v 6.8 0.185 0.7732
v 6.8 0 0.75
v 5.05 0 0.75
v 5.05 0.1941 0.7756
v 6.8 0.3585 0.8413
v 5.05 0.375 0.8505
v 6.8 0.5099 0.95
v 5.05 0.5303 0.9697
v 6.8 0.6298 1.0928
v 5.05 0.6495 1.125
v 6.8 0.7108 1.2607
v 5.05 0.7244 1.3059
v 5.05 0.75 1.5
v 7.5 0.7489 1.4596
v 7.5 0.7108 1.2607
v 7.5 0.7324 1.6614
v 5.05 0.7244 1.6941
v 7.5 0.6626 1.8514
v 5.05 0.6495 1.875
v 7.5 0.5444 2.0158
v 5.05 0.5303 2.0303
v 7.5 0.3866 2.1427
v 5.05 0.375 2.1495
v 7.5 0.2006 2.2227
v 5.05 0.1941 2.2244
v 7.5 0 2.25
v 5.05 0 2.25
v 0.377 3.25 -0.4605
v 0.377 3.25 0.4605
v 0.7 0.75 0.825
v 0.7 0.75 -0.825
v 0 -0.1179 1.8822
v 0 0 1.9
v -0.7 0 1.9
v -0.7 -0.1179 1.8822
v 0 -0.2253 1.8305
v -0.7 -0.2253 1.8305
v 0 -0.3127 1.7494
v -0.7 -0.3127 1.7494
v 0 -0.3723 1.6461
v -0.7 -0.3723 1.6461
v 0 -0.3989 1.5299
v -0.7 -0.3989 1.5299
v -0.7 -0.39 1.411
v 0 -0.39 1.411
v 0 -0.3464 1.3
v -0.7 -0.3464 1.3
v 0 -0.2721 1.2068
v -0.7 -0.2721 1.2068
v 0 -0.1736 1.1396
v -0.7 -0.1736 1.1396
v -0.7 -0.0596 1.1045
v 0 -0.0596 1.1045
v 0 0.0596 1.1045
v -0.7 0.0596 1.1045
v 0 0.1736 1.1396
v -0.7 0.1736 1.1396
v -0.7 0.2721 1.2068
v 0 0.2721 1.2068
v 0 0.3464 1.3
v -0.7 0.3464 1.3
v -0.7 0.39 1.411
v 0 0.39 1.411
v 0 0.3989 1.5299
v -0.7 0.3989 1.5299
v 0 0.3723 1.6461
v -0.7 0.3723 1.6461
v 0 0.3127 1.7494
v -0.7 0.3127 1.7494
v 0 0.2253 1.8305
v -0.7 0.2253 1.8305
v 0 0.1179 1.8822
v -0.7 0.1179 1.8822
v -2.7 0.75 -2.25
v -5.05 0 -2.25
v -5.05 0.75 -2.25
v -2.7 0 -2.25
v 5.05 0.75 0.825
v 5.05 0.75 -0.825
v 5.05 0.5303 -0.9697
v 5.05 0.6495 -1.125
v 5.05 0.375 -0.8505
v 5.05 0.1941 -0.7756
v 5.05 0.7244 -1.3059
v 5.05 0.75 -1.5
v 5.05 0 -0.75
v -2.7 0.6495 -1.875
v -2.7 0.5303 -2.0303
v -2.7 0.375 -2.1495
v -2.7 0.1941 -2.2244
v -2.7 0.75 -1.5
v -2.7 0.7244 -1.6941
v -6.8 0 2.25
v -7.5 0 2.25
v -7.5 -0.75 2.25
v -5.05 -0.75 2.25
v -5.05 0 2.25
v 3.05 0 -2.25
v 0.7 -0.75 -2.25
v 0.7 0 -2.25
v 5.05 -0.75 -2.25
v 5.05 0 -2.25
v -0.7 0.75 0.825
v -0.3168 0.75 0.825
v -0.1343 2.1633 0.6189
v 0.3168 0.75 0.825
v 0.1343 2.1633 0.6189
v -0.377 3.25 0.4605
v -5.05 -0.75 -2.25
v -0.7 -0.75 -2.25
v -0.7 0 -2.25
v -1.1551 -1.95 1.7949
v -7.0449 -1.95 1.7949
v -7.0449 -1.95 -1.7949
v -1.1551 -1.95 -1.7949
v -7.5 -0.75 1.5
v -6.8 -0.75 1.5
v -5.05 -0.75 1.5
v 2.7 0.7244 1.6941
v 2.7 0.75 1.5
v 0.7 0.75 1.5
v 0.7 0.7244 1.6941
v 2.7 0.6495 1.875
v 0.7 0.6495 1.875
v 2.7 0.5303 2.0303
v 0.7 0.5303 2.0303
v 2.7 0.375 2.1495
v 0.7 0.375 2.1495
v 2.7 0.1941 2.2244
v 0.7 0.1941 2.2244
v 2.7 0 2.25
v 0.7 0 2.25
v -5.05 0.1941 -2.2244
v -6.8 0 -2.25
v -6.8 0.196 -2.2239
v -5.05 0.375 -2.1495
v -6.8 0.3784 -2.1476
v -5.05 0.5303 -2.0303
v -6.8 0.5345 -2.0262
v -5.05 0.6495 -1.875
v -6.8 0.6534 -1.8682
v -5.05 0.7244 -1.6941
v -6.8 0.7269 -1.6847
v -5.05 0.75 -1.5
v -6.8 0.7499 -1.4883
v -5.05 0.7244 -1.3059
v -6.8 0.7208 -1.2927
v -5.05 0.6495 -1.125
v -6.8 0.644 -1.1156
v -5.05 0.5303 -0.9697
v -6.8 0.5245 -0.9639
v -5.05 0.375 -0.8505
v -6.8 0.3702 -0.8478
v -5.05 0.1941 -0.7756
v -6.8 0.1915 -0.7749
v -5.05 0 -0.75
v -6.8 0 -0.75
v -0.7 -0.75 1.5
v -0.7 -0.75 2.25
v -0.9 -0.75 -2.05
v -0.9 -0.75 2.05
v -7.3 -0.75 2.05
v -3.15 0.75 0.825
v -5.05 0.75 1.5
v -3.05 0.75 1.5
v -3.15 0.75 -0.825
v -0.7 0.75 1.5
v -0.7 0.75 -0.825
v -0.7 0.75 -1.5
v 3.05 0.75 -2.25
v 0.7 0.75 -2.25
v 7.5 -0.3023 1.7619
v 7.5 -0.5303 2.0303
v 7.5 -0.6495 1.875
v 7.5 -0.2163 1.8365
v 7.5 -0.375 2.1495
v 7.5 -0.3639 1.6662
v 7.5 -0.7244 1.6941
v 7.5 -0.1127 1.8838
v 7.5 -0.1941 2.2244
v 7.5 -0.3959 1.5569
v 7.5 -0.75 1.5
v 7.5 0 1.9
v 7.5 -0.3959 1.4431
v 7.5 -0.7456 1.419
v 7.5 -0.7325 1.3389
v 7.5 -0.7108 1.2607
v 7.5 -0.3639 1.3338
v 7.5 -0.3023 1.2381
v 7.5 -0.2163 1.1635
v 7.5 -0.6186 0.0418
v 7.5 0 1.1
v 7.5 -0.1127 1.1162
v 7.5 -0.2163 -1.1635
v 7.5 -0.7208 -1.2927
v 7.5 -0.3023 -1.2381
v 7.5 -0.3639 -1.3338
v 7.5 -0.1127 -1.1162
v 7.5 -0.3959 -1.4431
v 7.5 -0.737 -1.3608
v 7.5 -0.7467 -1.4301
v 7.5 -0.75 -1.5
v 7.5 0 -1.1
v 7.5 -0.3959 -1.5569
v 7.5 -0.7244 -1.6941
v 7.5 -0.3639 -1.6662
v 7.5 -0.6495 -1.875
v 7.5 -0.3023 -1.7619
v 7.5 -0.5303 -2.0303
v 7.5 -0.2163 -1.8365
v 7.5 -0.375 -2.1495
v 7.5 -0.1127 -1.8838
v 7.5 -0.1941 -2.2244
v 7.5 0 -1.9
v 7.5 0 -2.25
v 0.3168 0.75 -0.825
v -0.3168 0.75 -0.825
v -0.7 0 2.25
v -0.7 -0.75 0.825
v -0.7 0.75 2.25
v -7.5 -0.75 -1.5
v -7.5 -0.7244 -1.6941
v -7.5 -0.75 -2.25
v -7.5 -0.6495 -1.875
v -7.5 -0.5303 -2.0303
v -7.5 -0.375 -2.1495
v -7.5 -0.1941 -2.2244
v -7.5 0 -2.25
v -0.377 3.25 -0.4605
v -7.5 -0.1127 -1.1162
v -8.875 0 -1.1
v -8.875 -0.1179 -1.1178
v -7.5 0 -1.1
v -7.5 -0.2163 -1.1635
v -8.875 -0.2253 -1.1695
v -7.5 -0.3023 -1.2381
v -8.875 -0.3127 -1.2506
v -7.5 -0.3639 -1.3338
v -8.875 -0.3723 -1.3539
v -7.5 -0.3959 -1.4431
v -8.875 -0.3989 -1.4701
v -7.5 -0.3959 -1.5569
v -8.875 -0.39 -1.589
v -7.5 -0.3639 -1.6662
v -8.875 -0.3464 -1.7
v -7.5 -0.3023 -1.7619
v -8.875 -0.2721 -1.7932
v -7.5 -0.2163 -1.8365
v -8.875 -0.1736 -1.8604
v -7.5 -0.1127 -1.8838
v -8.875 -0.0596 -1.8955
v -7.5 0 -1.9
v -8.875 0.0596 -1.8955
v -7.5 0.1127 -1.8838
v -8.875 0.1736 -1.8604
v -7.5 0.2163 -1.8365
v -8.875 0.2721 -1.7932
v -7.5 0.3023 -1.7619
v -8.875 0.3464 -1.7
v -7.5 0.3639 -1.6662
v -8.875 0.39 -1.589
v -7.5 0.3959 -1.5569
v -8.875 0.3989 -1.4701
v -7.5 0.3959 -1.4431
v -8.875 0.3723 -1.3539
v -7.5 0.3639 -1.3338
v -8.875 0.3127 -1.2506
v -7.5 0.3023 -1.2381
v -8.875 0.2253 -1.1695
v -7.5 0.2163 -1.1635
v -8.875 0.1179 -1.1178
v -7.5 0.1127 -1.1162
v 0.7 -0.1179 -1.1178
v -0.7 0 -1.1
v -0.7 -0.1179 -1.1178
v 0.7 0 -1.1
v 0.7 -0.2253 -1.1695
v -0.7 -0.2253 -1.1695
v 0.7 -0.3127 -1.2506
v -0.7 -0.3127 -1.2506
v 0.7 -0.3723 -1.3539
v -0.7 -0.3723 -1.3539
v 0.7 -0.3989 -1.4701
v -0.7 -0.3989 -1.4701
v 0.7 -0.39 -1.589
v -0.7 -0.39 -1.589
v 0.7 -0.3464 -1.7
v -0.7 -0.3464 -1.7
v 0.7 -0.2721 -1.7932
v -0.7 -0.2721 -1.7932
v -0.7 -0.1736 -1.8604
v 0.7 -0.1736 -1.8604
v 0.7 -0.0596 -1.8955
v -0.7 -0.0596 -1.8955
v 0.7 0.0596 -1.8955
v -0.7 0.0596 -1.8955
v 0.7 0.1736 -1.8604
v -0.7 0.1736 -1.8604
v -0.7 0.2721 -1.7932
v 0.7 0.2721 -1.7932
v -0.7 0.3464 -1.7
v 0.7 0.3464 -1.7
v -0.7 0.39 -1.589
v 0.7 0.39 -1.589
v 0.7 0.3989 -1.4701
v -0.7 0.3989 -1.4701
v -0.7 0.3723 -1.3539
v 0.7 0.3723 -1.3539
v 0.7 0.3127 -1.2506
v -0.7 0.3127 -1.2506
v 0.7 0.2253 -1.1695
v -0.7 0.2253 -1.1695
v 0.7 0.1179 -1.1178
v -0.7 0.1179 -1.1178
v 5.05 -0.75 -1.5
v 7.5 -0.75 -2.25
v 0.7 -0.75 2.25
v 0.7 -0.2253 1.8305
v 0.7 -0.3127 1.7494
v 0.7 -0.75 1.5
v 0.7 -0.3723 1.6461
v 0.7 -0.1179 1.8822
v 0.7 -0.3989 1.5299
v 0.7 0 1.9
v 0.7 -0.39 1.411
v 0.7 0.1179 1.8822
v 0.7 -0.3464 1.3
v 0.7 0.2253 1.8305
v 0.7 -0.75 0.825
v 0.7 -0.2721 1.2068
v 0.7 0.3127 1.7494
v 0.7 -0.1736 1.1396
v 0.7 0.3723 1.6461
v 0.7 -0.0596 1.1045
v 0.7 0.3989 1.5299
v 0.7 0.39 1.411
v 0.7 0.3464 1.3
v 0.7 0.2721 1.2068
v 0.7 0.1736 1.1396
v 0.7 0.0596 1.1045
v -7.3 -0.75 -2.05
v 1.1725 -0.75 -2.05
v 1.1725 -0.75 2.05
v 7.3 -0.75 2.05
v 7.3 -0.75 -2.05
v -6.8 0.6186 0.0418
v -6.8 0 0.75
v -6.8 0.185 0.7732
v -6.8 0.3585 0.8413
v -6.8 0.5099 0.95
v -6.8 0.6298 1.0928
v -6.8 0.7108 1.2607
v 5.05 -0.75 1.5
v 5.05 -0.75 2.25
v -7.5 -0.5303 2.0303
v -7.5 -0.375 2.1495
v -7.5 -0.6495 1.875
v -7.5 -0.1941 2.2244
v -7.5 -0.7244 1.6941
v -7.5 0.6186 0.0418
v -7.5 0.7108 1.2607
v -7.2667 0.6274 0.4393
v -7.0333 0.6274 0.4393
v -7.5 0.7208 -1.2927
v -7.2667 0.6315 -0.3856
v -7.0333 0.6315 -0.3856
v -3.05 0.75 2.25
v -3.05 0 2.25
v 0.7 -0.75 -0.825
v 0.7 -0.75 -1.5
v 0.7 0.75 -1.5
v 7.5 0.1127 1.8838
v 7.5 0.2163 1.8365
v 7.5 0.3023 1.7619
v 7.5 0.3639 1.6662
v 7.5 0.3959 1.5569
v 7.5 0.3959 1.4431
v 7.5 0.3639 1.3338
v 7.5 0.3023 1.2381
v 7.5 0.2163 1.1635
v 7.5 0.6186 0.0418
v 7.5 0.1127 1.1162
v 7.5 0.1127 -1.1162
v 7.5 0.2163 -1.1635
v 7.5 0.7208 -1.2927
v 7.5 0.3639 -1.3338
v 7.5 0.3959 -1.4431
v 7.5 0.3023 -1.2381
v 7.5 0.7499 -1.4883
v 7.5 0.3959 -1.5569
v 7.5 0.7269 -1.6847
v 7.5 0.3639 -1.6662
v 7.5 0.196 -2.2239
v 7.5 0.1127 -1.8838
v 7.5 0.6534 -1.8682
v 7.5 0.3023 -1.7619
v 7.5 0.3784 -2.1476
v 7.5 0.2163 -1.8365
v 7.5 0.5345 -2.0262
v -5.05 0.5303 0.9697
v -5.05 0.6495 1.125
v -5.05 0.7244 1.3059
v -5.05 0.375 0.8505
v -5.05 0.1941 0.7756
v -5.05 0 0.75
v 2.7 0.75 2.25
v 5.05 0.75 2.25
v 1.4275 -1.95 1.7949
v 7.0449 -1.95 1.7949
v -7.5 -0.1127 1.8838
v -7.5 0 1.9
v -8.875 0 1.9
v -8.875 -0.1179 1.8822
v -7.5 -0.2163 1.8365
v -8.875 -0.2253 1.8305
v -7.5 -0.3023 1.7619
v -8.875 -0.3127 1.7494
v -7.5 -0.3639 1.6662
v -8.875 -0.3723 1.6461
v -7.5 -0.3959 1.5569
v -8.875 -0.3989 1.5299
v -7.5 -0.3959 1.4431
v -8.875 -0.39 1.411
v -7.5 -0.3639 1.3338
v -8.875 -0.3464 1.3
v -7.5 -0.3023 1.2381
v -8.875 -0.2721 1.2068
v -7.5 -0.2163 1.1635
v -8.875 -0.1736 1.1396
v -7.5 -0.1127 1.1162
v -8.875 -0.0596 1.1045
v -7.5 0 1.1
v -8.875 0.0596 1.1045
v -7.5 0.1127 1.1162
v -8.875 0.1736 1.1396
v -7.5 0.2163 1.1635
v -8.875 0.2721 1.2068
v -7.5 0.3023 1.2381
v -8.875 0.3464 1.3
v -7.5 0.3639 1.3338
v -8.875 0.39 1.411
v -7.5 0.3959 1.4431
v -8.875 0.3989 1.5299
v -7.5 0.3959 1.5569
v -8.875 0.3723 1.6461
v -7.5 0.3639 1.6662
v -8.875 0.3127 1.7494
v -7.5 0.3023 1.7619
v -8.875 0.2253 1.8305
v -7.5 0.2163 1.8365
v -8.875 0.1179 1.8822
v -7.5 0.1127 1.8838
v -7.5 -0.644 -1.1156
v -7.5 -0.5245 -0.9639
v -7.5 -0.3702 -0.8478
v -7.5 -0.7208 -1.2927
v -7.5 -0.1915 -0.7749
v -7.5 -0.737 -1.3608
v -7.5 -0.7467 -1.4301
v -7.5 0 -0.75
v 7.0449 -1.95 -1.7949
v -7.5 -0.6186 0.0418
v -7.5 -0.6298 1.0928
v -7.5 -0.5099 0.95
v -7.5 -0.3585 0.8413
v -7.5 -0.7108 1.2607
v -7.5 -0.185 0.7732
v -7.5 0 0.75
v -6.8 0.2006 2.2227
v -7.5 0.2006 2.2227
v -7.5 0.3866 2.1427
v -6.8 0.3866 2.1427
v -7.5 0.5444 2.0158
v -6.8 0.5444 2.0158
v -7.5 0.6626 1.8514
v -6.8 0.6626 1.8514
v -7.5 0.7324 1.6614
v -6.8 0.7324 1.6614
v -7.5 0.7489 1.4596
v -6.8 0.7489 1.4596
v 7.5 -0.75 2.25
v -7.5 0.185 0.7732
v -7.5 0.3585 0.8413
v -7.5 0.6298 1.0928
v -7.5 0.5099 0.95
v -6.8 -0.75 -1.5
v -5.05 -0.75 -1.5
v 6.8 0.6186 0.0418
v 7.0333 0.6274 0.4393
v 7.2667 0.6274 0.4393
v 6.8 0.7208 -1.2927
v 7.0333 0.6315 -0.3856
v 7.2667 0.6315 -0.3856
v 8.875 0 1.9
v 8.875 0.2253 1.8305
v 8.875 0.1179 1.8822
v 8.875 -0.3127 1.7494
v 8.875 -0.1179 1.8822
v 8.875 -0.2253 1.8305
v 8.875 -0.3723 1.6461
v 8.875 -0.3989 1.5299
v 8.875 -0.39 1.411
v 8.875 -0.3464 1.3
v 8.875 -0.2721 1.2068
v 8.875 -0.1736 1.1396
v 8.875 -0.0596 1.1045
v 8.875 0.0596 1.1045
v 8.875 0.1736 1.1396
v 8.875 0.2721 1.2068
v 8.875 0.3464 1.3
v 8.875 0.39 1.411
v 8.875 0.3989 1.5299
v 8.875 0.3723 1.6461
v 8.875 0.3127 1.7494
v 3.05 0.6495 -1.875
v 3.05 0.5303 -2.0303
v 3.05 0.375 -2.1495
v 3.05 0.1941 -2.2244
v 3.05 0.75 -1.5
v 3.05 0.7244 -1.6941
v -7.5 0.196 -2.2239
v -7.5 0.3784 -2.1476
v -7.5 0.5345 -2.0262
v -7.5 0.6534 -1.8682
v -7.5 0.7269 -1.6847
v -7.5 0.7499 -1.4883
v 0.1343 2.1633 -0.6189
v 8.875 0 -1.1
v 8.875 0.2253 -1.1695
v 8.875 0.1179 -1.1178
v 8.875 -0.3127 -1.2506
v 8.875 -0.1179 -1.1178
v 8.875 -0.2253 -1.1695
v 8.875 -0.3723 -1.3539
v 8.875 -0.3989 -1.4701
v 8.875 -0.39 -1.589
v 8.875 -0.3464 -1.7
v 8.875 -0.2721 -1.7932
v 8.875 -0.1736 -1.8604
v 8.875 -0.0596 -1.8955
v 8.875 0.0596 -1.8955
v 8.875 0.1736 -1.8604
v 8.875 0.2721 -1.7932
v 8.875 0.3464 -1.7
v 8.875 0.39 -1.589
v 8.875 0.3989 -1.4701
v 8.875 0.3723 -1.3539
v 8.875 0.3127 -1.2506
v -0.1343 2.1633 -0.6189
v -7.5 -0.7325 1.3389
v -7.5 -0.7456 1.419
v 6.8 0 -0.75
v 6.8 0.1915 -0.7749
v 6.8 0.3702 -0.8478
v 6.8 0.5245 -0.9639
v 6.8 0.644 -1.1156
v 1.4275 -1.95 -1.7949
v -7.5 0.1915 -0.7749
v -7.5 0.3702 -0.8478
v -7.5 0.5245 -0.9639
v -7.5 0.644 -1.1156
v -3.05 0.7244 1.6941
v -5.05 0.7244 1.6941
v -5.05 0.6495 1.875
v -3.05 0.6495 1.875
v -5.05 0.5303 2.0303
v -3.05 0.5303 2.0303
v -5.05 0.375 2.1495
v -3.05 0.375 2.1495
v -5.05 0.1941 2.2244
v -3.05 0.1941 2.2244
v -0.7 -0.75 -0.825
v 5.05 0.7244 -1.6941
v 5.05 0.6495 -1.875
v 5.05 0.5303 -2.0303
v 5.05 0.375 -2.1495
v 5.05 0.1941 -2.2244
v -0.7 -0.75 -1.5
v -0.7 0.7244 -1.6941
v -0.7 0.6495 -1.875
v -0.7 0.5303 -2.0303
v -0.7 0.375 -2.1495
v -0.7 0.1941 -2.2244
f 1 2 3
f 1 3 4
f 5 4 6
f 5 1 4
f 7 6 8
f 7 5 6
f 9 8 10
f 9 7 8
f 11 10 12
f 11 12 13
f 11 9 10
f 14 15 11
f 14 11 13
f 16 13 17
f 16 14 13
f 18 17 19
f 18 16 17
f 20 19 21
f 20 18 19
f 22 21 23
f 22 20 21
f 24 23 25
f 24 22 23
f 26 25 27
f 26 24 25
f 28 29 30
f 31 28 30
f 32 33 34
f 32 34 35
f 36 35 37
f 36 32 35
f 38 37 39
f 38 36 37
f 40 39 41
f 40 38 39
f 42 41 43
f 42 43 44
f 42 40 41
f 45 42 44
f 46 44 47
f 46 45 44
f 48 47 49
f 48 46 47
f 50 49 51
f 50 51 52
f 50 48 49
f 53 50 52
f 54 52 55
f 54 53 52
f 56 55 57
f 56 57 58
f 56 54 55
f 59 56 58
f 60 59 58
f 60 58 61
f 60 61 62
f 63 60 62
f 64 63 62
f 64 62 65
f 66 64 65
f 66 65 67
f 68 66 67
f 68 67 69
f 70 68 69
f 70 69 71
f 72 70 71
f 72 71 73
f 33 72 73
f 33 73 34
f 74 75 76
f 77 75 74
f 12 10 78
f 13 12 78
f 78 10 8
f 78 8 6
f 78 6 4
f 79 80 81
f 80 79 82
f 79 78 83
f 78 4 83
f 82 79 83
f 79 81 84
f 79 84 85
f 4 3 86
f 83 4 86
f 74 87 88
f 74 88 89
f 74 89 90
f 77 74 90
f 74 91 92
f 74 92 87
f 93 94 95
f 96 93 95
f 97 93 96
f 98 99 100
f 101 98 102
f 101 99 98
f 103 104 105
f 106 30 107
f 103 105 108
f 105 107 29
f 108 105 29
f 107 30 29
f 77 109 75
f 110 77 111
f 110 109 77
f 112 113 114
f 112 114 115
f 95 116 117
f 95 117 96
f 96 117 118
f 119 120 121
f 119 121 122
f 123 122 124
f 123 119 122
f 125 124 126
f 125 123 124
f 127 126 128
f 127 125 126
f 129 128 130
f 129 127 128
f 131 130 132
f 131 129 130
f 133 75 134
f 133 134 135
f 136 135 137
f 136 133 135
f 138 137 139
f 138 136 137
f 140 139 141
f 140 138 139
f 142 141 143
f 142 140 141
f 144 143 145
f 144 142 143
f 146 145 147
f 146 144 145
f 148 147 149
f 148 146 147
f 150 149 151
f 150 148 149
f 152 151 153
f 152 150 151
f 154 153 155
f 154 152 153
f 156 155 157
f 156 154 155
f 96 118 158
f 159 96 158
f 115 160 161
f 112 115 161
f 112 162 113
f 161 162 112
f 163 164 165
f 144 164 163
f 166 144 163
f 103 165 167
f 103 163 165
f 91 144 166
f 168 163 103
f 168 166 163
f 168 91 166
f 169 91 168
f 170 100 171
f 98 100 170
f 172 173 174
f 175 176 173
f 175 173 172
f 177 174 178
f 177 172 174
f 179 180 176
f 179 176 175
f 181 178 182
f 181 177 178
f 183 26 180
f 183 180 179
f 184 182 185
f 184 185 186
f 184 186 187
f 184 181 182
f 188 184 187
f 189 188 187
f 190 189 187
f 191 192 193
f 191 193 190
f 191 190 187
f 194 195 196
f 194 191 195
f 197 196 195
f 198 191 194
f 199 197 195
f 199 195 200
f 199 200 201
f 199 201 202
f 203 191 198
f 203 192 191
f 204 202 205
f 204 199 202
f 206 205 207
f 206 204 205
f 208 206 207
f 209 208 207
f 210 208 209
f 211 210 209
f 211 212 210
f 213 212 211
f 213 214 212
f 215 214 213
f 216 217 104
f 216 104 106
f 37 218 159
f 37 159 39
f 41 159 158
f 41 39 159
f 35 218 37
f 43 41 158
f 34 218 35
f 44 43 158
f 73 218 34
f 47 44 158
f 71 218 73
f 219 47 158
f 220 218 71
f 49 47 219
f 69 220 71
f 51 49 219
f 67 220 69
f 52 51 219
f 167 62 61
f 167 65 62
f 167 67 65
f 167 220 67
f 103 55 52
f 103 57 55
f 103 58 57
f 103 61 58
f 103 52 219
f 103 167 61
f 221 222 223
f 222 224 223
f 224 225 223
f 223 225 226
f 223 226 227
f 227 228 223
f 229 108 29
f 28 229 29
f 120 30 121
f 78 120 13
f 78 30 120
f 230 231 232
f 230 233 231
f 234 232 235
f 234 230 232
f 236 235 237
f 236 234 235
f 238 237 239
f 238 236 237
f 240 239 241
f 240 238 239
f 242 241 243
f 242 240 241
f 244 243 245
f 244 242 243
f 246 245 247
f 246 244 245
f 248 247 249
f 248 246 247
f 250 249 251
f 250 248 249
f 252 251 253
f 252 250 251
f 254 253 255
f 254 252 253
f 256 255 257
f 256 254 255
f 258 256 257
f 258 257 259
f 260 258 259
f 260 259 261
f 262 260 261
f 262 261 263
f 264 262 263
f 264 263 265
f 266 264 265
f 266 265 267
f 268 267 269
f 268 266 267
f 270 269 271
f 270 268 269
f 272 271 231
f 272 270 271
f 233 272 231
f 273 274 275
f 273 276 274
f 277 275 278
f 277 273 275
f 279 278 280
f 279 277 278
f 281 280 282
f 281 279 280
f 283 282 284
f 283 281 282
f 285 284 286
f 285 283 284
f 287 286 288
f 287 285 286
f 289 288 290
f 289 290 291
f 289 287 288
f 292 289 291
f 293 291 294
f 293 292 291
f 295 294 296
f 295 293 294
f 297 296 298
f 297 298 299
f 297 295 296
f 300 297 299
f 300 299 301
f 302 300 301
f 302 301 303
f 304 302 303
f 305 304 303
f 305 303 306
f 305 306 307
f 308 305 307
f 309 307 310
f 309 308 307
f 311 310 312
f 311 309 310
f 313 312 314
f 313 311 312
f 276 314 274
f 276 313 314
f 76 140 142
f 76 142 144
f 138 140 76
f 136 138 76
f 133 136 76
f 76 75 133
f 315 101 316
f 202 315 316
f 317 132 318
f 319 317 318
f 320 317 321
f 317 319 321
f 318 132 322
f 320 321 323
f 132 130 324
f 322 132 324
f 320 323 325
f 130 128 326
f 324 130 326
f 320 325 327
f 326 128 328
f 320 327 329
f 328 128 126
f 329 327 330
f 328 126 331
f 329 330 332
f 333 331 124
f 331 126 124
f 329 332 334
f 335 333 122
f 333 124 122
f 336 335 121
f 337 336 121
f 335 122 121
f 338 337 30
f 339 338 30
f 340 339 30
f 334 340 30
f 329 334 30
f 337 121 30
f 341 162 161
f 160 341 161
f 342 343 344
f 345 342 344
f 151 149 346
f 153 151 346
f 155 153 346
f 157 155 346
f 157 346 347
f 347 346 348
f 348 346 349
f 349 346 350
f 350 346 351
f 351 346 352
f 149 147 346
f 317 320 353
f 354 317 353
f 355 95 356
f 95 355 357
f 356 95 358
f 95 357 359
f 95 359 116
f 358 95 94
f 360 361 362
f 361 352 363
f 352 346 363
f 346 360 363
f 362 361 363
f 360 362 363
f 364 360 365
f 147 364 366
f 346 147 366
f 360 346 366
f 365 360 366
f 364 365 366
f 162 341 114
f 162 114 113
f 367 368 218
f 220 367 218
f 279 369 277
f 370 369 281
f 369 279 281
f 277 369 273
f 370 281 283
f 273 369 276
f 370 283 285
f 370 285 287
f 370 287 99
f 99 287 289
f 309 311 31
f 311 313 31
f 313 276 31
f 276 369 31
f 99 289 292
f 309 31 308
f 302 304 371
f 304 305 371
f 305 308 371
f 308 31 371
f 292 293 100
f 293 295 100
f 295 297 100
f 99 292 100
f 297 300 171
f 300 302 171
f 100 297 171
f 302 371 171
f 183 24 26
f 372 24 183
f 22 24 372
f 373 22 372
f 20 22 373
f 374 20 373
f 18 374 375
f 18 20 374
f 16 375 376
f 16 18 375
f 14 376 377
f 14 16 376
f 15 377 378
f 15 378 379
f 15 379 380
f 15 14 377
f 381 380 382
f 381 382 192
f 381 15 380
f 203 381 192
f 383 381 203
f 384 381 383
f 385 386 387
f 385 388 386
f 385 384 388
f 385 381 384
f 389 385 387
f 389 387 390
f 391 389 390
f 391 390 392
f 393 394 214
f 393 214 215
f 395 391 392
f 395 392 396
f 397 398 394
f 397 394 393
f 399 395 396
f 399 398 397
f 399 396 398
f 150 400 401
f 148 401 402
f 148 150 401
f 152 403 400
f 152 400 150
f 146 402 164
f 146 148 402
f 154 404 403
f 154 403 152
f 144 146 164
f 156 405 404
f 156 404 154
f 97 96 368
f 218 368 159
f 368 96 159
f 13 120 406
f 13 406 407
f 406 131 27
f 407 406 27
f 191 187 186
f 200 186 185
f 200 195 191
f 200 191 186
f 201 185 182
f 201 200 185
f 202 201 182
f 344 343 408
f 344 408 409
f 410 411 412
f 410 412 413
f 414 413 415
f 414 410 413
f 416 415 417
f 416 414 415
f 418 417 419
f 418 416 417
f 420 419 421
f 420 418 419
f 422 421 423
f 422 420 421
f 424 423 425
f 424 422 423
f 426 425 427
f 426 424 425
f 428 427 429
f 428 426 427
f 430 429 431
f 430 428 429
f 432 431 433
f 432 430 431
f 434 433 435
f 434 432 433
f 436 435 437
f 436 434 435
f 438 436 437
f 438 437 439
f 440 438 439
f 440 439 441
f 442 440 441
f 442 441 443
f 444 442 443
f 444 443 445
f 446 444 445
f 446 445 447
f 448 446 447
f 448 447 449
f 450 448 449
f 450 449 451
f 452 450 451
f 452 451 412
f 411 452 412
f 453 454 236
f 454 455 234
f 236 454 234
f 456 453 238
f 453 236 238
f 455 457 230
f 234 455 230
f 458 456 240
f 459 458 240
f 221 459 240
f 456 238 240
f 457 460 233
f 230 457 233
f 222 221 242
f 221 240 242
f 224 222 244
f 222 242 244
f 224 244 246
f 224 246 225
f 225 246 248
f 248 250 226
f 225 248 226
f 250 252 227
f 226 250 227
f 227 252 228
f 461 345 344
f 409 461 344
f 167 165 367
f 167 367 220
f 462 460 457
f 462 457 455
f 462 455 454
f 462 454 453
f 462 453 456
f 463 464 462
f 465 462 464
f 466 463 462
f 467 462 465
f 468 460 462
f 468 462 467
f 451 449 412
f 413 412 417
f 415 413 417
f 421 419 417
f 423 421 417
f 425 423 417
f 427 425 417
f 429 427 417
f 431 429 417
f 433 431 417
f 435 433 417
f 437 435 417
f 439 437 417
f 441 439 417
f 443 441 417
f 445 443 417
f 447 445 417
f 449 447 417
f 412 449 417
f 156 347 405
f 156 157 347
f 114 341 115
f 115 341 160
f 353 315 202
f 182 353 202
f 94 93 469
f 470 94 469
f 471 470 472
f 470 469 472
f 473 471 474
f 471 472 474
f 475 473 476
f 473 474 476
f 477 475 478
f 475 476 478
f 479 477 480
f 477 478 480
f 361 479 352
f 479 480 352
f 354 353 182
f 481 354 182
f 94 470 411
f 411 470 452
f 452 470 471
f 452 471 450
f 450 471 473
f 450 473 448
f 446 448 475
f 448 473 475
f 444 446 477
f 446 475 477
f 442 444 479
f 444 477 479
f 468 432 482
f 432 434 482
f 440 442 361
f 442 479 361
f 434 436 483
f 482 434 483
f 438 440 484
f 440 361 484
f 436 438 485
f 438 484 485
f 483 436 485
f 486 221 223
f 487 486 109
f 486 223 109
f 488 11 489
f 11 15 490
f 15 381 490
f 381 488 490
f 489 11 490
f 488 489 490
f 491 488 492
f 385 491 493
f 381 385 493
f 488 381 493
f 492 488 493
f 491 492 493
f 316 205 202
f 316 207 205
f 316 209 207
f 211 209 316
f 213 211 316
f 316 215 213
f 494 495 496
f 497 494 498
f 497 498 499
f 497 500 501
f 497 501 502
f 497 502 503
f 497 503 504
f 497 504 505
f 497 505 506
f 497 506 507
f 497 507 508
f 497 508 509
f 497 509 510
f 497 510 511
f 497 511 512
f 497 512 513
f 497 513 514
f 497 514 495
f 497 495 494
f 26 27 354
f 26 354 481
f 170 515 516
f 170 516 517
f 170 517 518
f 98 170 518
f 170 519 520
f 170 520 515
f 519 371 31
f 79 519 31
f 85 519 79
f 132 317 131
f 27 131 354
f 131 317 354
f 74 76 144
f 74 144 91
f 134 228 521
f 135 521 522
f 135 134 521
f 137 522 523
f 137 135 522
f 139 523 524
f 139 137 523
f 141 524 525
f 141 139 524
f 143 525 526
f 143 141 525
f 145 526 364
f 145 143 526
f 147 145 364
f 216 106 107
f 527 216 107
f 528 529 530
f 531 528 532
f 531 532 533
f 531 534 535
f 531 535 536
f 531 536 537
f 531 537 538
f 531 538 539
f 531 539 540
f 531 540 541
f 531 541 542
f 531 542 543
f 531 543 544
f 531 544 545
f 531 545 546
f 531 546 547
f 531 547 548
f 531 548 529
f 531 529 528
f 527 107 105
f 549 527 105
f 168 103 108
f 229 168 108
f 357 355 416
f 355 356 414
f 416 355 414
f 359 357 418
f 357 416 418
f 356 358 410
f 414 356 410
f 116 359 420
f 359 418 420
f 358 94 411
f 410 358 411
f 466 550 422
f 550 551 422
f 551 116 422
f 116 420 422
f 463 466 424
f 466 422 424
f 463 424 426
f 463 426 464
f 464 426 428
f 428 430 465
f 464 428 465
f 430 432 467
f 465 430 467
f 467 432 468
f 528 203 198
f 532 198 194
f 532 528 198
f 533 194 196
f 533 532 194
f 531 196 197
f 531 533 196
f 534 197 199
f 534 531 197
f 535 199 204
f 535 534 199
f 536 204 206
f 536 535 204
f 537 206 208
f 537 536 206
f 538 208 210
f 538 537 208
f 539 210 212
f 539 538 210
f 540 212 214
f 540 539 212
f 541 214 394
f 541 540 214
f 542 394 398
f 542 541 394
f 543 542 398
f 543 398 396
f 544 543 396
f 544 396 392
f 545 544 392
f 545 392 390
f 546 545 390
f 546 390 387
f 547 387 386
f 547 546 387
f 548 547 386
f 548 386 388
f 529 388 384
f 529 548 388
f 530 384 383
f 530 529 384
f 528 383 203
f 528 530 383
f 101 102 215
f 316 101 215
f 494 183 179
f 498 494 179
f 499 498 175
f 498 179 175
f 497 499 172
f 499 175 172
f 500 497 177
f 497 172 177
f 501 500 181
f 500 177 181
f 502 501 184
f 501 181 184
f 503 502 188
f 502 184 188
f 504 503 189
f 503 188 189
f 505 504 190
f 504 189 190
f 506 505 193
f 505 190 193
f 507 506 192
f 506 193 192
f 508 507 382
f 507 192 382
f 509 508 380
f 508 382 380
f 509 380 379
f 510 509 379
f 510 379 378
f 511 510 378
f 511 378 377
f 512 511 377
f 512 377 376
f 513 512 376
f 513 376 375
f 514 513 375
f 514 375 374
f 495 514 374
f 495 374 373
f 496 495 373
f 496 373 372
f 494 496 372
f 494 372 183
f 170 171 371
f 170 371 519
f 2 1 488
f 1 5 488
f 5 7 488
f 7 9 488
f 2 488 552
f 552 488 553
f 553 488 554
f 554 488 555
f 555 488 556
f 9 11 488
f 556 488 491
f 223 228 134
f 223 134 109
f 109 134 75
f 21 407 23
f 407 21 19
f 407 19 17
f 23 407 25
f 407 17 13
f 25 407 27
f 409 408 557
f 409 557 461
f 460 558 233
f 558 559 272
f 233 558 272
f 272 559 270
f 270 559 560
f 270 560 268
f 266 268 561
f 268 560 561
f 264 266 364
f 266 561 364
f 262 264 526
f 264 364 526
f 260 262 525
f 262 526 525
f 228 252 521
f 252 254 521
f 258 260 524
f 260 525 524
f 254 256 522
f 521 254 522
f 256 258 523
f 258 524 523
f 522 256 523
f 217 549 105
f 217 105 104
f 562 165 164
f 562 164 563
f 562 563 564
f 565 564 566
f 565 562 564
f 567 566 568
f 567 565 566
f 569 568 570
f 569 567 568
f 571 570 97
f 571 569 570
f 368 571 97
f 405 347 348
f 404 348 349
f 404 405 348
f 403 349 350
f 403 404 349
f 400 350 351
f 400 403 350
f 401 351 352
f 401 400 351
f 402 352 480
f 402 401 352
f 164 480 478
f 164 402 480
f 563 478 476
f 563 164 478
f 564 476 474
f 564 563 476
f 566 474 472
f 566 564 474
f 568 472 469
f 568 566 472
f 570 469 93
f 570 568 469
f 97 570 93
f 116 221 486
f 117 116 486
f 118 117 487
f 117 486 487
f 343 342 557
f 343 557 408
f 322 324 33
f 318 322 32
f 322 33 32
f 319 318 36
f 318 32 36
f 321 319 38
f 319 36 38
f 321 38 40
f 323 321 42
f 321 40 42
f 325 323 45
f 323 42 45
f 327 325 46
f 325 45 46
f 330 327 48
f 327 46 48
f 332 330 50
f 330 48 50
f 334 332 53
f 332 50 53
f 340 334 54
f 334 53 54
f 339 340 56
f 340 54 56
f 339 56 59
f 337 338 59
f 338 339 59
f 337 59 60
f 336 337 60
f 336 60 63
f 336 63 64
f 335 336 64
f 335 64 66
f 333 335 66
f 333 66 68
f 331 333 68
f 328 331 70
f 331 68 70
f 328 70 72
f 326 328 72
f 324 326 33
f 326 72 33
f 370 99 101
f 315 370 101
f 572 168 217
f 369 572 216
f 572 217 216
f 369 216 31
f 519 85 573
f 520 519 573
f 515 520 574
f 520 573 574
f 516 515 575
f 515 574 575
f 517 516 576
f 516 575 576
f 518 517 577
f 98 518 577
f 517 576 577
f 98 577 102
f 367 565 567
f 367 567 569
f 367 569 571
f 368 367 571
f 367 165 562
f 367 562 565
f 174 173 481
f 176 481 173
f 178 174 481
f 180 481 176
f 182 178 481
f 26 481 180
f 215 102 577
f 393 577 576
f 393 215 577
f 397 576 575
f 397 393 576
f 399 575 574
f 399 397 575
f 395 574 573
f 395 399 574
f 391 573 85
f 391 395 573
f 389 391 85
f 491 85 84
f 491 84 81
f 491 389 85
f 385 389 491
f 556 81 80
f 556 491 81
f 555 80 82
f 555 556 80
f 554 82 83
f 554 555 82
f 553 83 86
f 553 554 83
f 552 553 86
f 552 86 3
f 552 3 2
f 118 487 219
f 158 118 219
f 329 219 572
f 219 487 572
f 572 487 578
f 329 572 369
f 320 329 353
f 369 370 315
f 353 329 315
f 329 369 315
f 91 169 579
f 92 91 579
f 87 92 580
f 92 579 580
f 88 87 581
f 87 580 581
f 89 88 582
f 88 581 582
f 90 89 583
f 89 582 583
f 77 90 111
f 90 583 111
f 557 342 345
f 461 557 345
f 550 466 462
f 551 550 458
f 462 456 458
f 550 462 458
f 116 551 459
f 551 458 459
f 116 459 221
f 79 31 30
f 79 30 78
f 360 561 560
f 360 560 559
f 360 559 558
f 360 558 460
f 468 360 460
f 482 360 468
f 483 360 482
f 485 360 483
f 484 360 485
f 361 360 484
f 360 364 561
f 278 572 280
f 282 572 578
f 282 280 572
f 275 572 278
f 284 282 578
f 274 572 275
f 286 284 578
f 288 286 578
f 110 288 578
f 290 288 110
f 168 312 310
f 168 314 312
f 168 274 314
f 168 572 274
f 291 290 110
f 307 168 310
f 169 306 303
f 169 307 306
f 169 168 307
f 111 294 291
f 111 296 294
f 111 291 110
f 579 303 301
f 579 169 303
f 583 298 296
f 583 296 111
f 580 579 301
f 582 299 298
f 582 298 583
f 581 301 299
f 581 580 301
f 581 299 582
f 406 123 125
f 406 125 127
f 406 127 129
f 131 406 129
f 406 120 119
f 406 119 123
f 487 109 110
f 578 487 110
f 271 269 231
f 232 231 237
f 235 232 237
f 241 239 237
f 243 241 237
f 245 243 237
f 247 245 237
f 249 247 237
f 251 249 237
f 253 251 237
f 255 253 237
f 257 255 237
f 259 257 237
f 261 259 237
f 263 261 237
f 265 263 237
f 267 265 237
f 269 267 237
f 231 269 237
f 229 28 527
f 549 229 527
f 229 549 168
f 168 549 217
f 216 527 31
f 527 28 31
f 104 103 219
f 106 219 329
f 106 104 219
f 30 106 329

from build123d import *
from build123d.topology import SkipClean

# Parameters (mm, degrees)
ESBO_O2_R                          = 0.75
RESSALTO_EXTRUS_O1_DEPTH           = 7.5
RESSALTO_EXTRUS_O1_2_DEPTH         = 7.5
RESSALTO_EXTRUS_O2_DEPTH           = 0.7
RESSALTO_EXTRUS_O3_START           = -0.7
RESSALTO_EXTRUS_O3_DEPTH           = 0.7
RESSALTO_EXTRUS_O4_DEPTH           = 0.75
RESSALTO_EXTRUS_O4_DEPTH_BACK      = 0.75
ESBO_O5_W                          = 10.1
ESBO_O5_H                          = 4.5
ESBO_O6_W                          = 1.4
ESBO_O6_H                          = 1.425
CORTE_EXTRUS_O1_DEPTH              = 10.75
CORTE_EXTRUS_O4_DEPTH              = 2
CORTE_EXTRUS_O5_DEPTH              = 2
CORTE_EXTRUS_O6_START              = -2
CORTE_EXTRUS_O6_DEPTH              = 2
CORTE_EXTRUS_O7_START              = -2
CORTE_EXTRUS_O7_DEPTH              = 2
RESSALTO_EXTRUS_O6_DEPTH           = 1.65
CORTE_EXTRUS_O8_DEPTH              = 8.2
ESBO_O17_R                         = 0.4
RESSALTO_EXTRUS_O7_DEPTH           = 8.875
ESBO_O18_W                         = 2.45
ESBO_O18_H                         = 4.5
RESSALTO_EXTRUS_O8_DEPTH           = 0.75
ESBO_O14_W                         = 6.4
ESBO_O14_H                         = 4.1
RESSALTO_EXTRUS_O9_DEPTH           = 1.2
RESSALTO_EXTRUS_O9_DRAFT           = 12
ESBO_O14_W_2                       = 6.127542103
RESSALTO_EXTRUS_O9_PROFILE_2_DEPTH = 1.2
RESSALTO_EXTRUS_O9_PROFILE_2_DRAFT = 12


with BuildPart() as part:
    # Esboço2 → Ressalto-extrusão1 (new, symmetric)
    with BuildSketch(Plane(origin=(0, 0, 0), x_dir=(0, 0, -1), z_dir=(1, 0, 0))):
        with Locations((-1.5, 0)):
            Circle(ESBO_O2_R)
    extrude(amount=RESSALTO_EXTRUS_O1_DEPTH, both=True)



with BuildPart() as body_2:
    # Esboço2 → Ressalto-extrus_o1 2 (new, symmetric)
    with BuildSketch(Plane(origin=(0, 0, 0), x_dir=(0, 0, -1), z_dir=(1, 0, 0))):
        with Locations((1.5, 0)):
            Circle(ESBO_O2_R)
    extrude(amount=RESSALTO_EXTRUS_O1_2_DEPTH, both=True)


with BuildPart() as part_1:
    add(part.part)

    add(body_2.part)  # Ressalto-extrusão2 merges body 2
    # Esboço3 → Ressalto-extrusão2 (add)
    with BuildSketch(Plane(origin=(7.5, 0, 0), x_dir=(0, 0, -1), z_dir=(1, 0, 0))):
        with BuildLine():
            ThreePointArc((-1.260740828, 0.710812949), (-2.25, 0), (-1.260740828, -0.710812949))
            add(Edge.make_bspline(
                [(-1.260740828, -0.710812949), (-0.414793738, -0.582924516), (0.318358464, -0.589654398), (1.292699553, -0.720781884)],
                knots=[0.079996458, 0.079996458, 0.079996458, 0.079996458, 0.940072382, 0.940072382, 0.940072382, 0.940072382], degree=3))
            ThreePointArc((1.292699553, -0.720781884), (2.25, 0), (1.292699553, 0.720781884))
            add(Edge.make_bspline(
                [(-1.260740828, 0.710812949), (-0.414793738, 0.582924516), (0.318358464, 0.589654398), (1.292699553, 0.720781884)],
                knots=[0.079996458, 0.079996458, 0.079996458, 0.079996458, 0.940072382, 0.940072382, 0.940072382, 0.940072382], degree=3))
        make_face()
    extrude(amount=-RESSALTO_EXTRUS_O2_DEPTH)

    # Esboço4 → Ressalto-extrusão3 (add)
    with SkipClean():  # the faces are left unmerged after this step: merging them gives an invalid solid
        with BuildSketch(Plane.ZY.offset(7.5).offset(RESSALTO_EXTRUS_O3_START)):
            with BuildLine():
                ThreePointArc((1.260740828, -0.710812949), (2.25, 0), (1.260740828, 0.710812949))
                add(Edge.make_bspline(
                    [(1.260740828, 0.710812949), (0.414793738, 0.582924516), (-0.318358464, 0.589654398), (-1.292699553, 0.720781884)],
                    knots=[0.079996458, 0.079996458, 0.079996458, 0.079996458, 0.940072382, 0.940072382, 0.940072382, 0.940072382], degree=3))
                ThreePointArc((-1.292699553, 0.720781884), (-2.25, 0), (-1.292699553, -0.720781884))
                add(Edge.make_bspline(
                    [(-1.292699553, -0.720781884), (-0.318358464, -0.589654398), (0.414793738, -0.582924516), (1.260740828, -0.710812949)],
                    knots=[0.079996458, 0.079996458, 0.079996458, 0.079996458, 0.940072382, 0.940072382, 0.940072382, 0.940072382], degree=3))
            make_face()
        extrude(amount=RESSALTO_EXTRUS_O3_DEPTH)

    # Esboço5 → Ressalto-extrusão4 (add, two sides: drawn at the far end of the back side and taken through both)
    with SkipClean():  # the faces are left unmerged after this step: merging them gives an invalid solid
        with BuildSketch(Plane(origin=(0, 0, 0), x_dir=(1, 0, 0), z_dir=(0, 1, 0)).offset(-RESSALTO_EXTRUS_O4_DEPTH_BACK)):
            Rectangle(ESBO_O5_W, ESBO_O5_H)
        extrude(amount=RESSALTO_EXTRUS_O4_DEPTH + RESSALTO_EXTRUS_O4_DEPTH_BACK)

    # Esboço6 → Corte-extrusão1 (cut)
    with SkipClean():  # the faces are left unmerged after this step: merging them gives an invalid solid
        with BuildSketch(Plane(origin=(0, 0.75, 0), x_dir=(1, 0, 0), z_dir=(0, 1, 0))):
            with Locations((0, -1.5375)):
                Rectangle(ESBO_O6_W, ESBO_O6_H)
            with Locations((0, 1.5375)):
                Rectangle(ESBO_O6_W, ESBO_O6_H)
        extrude(amount=-CORTE_EXTRUS_O1_DEPTH, mode=Mode.SUBTRACT)

    # Esboço10 → Corte-extrusão4 (cut)
    with SkipClean():  # the faces are left unmerged after this step: merging them gives an invalid solid
        with BuildSketch(Plane(origin=(5.05, 0, 0), x_dir=(0, 0, -1), z_dir=(1, 0, 0))):
            with BuildLine():
                Line((2.25, 0), (2.25, 0.75))
                Line((2.25, 0.75), (1.5, 0.75))
                ThreePointArc((1.5, 0.75), (2.030330086, 0.530330086), (2.25, 0))
            make_face()
        extrude(amount=-CORTE_EXTRUS_O4_DEPTH, mode=Mode.SUBTRACT)

    # Esboço11 → Corte-extrusão5 (cut)
    with SkipClean():  # the faces are left unmerged after this step: merging them gives an invalid solid
        with BuildSketch(Plane(origin=(-0.7, 0, 0), x_dir=(0, 0, -1), z_dir=(1, 0, 0))):
            with BuildLine():
                Line((2.25, 0), (2.25, 0.75))
                Line((2.25, 0.75), (1.5, 0.75))
                ThreePointArc((1.5, 0.75), (2.030330086, 0.530330086), (2.25, 0))
            make_face()
        extrude(amount=-CORTE_EXTRUS_O5_DEPTH, mode=Mode.SUBTRACT)

    # Esboço12 → Corte-extrusão6 (cut)
    with SkipClean():  # the faces are left unmerged after this step: merging them gives an invalid solid
        with BuildSketch(Plane.ZY.offset(5.05).offset(CORTE_EXTRUS_O6_START)):
            with BuildLine():
                Line((2.25, 0), (2.25, 0.75))
                Line((2.25, 0.75), (1.5, 0.75))
                ThreePointArc((1.5, 0.75), (2.030330086, 0.530330086), (2.25, 0))
            make_face()
        extrude(amount=CORTE_EXTRUS_O6_DEPTH, mode=Mode.SUBTRACT)

    # Esboço13 → Corte-extrusão7 (cut)
    with SkipClean():  # the faces are left unmerged after this step: merging them gives an invalid solid
        with BuildSketch(Plane.ZY.offset(-0.7).offset(CORTE_EXTRUS_O7_START)):
            with BuildLine():
                Line((2.25, 0), (2.25, 0.75))
                Line((2.25, 0.75), (1.5, 0.75))
                ThreePointArc((1.5, 0.75), (2.030330086, 0.530330086), (2.25, 0))
            make_face()
        extrude(amount=CORTE_EXTRUS_O7_DEPTH, mode=Mode.SUBTRACT)

    # Esboço15 → Ressalto-extrusão6 (add)
    with SkipClean():  # the faces are left unmerged after this step: merging them gives an invalid solid
        with BuildSketch(Plane.XY.offset(0.825)):
            Polygon((-0.7, 0.75), (-0.377007733, 3.25), (0.377007733, 3.25), (0.7, 0.75), (0.316841675, 0.75), (0.134253605, 2.163254196), (-0.134253605, 2.163254196), (-0.316841675, 0.75), align=None)
        extrude(amount=-RESSALTO_EXTRUS_O6_DEPTH)

    # Esboço16 → Corte-extrusão8 (cut)
    with SkipClean():  # the faces are left unmerged after this step: merging them gives an invalid solid
        with BuildSketch(Plane(origin=(5.05, 0, 0), x_dir=(0, 0, -1), z_dir=(1, 0, 0))):
            Polygon((-0.46047459, 3.25), (0.46047459, 3.25), (0.825, 0.75), (1.700771093, 3.688563276), (-1.641477372, 3.918008251), (-0.825, 0.75), align=None)
        extrude(amount=-CORTE_EXTRUS_O8_DEPTH, mode=Mode.SUBTRACT)

    # Esboço17 → Ressalto-extrusão7 (add, symmetric)
    with SkipClean():  # the faces are left unmerged after this step: merging them gives an invalid solid
        with BuildSketch(Plane(origin=(0, 0, 0), x_dir=(0, 0, -1), z_dir=(1, 0, 0))):
            with Locations(Location((-1.5, 0, 0), (0, 0, 180))):
                Circle(ESBO_O17_R)
            with Locations(Location((1.5, 0, 0), (0, 0, 180))):
                Circle(ESBO_O17_R)
        extrude(amount=RESSALTO_EXTRUS_O7_DEPTH, both=True)

    # Esboço18 → Ressalto-extrusão8 (add)
    with SkipClean():  # the faces are left unmerged after this step: merging them gives an invalid solid
        with BuildSketch(Plane(origin=(0, 0, 0), x_dir=(1, 0, 0), z_dir=(0, 1, 0))):
            with Locations((6.275, 0)):
                Rectangle(ESBO_O18_W, ESBO_O18_H)
            with Locations((-6.275, 0)):
                Rectangle(ESBO_O18_W, ESBO_O18_H)
        extrude(amount=-RESSALTO_EXTRUS_O8_DEPTH)


with BuildPart() as body_2_2:
    # Esboço14 → Ressalto-extrusão9 (with draft: the straight prism first)
    with BuildSketch(Plane.XZ.offset(0.75)):
        with Locations((-4.1, 0)):
            Rectangle(ESBO_O14_W, ESBO_O14_H)
    extrude(amount=RESSALTO_EXTRUS_O9_DEPTH)
    # Ressalto-extrusão9: the draft: its side faces are tilted about the plane it starts from
    ressalto_extrus_o9_sides = [body_2_2.faces().sort_by_distance(p)[0] for p in [
        (-4.1, -1.35, 2.05),
        (-7.3, -1.35, 0),
        (-4.1, -1.35, -2.05),
        (-0.9, -1.35, 0),
    ]]
    draft(ressalto_extrus_o9_sides, Plane.XZ.offset(0.75), RESSALTO_EXTRUS_O9_DRAFT)


with BuildPart() as body_3:
    # Esboço14 → Ressalto-extrusão9 profile 2 (with draft: the straight prism first)
    with BuildSketch(Plane.XZ.offset(0.75)):
        with Locations((4.236228949, 0)):
            Rectangle(ESBO_O14_W_2, ESBO_O14_H)
    extrude(amount=RESSALTO_EXTRUS_O9_PROFILE_2_DEPTH)
    # Ressalto-extrusão9 profile 2: the draft: its side faces are tilted about the plane it starts from
    ressalto_extrus_o9_profile_2_sides = [body_3.faces().sort_by_distance(p)[0] for p in [
        (4.236228948, -1.35, 2.05),
        (1.172457897, -1.35, 0),
        (4.236228948, -1.35, -2.05),
        (7.3, -1.35, 0),
    ]]
    draft(ressalto_extrus_o9_profile_2_sides, Plane.XZ.offset(0.75), RESSALTO_EXTRUS_O9_PROFILE_2_DRAFT)


solid = Compound([part_1.part, body_2_2.part, body_3.part])
